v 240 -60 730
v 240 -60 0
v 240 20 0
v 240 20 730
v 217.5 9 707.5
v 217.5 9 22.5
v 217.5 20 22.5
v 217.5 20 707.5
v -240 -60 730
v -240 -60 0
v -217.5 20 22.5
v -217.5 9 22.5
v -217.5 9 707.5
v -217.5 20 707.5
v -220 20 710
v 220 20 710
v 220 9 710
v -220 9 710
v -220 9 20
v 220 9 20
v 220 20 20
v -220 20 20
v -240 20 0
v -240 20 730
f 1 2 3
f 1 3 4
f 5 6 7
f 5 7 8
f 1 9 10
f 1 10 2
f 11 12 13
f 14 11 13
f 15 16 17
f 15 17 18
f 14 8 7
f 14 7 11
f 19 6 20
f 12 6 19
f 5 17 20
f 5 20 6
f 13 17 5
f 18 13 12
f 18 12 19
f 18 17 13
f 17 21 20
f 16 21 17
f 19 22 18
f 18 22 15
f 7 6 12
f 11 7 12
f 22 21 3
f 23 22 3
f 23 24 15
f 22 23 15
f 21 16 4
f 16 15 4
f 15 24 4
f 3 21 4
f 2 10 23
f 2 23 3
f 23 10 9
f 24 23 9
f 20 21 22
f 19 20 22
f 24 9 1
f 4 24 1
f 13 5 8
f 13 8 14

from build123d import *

# Parameters (mm, degrees)
SKETCH1_W           = 480
SKETCH1_H           = 730
BOSS_EXTRUDE1_DEPTH = 80
SKETCH2_W           = 440
SKETCH2_H           = 690
CUT_EXTRUDE1_DEPTH  = 11
SKETCH3_W           = 435
SKETCH3_H           = 685
BOSS_EXTRUDE2_DEPTH = 11


with BuildPart() as part:
    # Sketch1 → Boss-Extrude1 (new body)
    with BuildSketch(Plane.XZ.offset(60)):
        with Locations((0, 365)):
            Rectangle(SKETCH1_W, SKETCH1_H)
    extrude(amount=-BOSS_EXTRUDE1_DEPTH)

    # Sketch2 → Cut-Extrude1 (cut)
    with BuildSketch(Plane(origin=(0, 20, 0), x_dir=(-1, 0, 0), z_dir=(0, 1, 0))):
        with Locations((0, 365)):
            Rectangle(SKETCH2_W, SKETCH2_H)
    extrude(amount=-CUT_EXTRUDE1_DEPTH, mode=Mode.SUBTRACT)

    # Sketch3 → Boss-Extrude2 (add)
    with BuildSketch(Plane(origin=(0, 9, 0), x_dir=(-1, 0, 0), z_dir=(0, 1, 0))):
        with Locations((0, 365)):
            Rectangle(SKETCH3_W, SKETCH3_H)
    extrude(amount=BOSS_EXTRUDE2_DEPTH)


solid = part.part
